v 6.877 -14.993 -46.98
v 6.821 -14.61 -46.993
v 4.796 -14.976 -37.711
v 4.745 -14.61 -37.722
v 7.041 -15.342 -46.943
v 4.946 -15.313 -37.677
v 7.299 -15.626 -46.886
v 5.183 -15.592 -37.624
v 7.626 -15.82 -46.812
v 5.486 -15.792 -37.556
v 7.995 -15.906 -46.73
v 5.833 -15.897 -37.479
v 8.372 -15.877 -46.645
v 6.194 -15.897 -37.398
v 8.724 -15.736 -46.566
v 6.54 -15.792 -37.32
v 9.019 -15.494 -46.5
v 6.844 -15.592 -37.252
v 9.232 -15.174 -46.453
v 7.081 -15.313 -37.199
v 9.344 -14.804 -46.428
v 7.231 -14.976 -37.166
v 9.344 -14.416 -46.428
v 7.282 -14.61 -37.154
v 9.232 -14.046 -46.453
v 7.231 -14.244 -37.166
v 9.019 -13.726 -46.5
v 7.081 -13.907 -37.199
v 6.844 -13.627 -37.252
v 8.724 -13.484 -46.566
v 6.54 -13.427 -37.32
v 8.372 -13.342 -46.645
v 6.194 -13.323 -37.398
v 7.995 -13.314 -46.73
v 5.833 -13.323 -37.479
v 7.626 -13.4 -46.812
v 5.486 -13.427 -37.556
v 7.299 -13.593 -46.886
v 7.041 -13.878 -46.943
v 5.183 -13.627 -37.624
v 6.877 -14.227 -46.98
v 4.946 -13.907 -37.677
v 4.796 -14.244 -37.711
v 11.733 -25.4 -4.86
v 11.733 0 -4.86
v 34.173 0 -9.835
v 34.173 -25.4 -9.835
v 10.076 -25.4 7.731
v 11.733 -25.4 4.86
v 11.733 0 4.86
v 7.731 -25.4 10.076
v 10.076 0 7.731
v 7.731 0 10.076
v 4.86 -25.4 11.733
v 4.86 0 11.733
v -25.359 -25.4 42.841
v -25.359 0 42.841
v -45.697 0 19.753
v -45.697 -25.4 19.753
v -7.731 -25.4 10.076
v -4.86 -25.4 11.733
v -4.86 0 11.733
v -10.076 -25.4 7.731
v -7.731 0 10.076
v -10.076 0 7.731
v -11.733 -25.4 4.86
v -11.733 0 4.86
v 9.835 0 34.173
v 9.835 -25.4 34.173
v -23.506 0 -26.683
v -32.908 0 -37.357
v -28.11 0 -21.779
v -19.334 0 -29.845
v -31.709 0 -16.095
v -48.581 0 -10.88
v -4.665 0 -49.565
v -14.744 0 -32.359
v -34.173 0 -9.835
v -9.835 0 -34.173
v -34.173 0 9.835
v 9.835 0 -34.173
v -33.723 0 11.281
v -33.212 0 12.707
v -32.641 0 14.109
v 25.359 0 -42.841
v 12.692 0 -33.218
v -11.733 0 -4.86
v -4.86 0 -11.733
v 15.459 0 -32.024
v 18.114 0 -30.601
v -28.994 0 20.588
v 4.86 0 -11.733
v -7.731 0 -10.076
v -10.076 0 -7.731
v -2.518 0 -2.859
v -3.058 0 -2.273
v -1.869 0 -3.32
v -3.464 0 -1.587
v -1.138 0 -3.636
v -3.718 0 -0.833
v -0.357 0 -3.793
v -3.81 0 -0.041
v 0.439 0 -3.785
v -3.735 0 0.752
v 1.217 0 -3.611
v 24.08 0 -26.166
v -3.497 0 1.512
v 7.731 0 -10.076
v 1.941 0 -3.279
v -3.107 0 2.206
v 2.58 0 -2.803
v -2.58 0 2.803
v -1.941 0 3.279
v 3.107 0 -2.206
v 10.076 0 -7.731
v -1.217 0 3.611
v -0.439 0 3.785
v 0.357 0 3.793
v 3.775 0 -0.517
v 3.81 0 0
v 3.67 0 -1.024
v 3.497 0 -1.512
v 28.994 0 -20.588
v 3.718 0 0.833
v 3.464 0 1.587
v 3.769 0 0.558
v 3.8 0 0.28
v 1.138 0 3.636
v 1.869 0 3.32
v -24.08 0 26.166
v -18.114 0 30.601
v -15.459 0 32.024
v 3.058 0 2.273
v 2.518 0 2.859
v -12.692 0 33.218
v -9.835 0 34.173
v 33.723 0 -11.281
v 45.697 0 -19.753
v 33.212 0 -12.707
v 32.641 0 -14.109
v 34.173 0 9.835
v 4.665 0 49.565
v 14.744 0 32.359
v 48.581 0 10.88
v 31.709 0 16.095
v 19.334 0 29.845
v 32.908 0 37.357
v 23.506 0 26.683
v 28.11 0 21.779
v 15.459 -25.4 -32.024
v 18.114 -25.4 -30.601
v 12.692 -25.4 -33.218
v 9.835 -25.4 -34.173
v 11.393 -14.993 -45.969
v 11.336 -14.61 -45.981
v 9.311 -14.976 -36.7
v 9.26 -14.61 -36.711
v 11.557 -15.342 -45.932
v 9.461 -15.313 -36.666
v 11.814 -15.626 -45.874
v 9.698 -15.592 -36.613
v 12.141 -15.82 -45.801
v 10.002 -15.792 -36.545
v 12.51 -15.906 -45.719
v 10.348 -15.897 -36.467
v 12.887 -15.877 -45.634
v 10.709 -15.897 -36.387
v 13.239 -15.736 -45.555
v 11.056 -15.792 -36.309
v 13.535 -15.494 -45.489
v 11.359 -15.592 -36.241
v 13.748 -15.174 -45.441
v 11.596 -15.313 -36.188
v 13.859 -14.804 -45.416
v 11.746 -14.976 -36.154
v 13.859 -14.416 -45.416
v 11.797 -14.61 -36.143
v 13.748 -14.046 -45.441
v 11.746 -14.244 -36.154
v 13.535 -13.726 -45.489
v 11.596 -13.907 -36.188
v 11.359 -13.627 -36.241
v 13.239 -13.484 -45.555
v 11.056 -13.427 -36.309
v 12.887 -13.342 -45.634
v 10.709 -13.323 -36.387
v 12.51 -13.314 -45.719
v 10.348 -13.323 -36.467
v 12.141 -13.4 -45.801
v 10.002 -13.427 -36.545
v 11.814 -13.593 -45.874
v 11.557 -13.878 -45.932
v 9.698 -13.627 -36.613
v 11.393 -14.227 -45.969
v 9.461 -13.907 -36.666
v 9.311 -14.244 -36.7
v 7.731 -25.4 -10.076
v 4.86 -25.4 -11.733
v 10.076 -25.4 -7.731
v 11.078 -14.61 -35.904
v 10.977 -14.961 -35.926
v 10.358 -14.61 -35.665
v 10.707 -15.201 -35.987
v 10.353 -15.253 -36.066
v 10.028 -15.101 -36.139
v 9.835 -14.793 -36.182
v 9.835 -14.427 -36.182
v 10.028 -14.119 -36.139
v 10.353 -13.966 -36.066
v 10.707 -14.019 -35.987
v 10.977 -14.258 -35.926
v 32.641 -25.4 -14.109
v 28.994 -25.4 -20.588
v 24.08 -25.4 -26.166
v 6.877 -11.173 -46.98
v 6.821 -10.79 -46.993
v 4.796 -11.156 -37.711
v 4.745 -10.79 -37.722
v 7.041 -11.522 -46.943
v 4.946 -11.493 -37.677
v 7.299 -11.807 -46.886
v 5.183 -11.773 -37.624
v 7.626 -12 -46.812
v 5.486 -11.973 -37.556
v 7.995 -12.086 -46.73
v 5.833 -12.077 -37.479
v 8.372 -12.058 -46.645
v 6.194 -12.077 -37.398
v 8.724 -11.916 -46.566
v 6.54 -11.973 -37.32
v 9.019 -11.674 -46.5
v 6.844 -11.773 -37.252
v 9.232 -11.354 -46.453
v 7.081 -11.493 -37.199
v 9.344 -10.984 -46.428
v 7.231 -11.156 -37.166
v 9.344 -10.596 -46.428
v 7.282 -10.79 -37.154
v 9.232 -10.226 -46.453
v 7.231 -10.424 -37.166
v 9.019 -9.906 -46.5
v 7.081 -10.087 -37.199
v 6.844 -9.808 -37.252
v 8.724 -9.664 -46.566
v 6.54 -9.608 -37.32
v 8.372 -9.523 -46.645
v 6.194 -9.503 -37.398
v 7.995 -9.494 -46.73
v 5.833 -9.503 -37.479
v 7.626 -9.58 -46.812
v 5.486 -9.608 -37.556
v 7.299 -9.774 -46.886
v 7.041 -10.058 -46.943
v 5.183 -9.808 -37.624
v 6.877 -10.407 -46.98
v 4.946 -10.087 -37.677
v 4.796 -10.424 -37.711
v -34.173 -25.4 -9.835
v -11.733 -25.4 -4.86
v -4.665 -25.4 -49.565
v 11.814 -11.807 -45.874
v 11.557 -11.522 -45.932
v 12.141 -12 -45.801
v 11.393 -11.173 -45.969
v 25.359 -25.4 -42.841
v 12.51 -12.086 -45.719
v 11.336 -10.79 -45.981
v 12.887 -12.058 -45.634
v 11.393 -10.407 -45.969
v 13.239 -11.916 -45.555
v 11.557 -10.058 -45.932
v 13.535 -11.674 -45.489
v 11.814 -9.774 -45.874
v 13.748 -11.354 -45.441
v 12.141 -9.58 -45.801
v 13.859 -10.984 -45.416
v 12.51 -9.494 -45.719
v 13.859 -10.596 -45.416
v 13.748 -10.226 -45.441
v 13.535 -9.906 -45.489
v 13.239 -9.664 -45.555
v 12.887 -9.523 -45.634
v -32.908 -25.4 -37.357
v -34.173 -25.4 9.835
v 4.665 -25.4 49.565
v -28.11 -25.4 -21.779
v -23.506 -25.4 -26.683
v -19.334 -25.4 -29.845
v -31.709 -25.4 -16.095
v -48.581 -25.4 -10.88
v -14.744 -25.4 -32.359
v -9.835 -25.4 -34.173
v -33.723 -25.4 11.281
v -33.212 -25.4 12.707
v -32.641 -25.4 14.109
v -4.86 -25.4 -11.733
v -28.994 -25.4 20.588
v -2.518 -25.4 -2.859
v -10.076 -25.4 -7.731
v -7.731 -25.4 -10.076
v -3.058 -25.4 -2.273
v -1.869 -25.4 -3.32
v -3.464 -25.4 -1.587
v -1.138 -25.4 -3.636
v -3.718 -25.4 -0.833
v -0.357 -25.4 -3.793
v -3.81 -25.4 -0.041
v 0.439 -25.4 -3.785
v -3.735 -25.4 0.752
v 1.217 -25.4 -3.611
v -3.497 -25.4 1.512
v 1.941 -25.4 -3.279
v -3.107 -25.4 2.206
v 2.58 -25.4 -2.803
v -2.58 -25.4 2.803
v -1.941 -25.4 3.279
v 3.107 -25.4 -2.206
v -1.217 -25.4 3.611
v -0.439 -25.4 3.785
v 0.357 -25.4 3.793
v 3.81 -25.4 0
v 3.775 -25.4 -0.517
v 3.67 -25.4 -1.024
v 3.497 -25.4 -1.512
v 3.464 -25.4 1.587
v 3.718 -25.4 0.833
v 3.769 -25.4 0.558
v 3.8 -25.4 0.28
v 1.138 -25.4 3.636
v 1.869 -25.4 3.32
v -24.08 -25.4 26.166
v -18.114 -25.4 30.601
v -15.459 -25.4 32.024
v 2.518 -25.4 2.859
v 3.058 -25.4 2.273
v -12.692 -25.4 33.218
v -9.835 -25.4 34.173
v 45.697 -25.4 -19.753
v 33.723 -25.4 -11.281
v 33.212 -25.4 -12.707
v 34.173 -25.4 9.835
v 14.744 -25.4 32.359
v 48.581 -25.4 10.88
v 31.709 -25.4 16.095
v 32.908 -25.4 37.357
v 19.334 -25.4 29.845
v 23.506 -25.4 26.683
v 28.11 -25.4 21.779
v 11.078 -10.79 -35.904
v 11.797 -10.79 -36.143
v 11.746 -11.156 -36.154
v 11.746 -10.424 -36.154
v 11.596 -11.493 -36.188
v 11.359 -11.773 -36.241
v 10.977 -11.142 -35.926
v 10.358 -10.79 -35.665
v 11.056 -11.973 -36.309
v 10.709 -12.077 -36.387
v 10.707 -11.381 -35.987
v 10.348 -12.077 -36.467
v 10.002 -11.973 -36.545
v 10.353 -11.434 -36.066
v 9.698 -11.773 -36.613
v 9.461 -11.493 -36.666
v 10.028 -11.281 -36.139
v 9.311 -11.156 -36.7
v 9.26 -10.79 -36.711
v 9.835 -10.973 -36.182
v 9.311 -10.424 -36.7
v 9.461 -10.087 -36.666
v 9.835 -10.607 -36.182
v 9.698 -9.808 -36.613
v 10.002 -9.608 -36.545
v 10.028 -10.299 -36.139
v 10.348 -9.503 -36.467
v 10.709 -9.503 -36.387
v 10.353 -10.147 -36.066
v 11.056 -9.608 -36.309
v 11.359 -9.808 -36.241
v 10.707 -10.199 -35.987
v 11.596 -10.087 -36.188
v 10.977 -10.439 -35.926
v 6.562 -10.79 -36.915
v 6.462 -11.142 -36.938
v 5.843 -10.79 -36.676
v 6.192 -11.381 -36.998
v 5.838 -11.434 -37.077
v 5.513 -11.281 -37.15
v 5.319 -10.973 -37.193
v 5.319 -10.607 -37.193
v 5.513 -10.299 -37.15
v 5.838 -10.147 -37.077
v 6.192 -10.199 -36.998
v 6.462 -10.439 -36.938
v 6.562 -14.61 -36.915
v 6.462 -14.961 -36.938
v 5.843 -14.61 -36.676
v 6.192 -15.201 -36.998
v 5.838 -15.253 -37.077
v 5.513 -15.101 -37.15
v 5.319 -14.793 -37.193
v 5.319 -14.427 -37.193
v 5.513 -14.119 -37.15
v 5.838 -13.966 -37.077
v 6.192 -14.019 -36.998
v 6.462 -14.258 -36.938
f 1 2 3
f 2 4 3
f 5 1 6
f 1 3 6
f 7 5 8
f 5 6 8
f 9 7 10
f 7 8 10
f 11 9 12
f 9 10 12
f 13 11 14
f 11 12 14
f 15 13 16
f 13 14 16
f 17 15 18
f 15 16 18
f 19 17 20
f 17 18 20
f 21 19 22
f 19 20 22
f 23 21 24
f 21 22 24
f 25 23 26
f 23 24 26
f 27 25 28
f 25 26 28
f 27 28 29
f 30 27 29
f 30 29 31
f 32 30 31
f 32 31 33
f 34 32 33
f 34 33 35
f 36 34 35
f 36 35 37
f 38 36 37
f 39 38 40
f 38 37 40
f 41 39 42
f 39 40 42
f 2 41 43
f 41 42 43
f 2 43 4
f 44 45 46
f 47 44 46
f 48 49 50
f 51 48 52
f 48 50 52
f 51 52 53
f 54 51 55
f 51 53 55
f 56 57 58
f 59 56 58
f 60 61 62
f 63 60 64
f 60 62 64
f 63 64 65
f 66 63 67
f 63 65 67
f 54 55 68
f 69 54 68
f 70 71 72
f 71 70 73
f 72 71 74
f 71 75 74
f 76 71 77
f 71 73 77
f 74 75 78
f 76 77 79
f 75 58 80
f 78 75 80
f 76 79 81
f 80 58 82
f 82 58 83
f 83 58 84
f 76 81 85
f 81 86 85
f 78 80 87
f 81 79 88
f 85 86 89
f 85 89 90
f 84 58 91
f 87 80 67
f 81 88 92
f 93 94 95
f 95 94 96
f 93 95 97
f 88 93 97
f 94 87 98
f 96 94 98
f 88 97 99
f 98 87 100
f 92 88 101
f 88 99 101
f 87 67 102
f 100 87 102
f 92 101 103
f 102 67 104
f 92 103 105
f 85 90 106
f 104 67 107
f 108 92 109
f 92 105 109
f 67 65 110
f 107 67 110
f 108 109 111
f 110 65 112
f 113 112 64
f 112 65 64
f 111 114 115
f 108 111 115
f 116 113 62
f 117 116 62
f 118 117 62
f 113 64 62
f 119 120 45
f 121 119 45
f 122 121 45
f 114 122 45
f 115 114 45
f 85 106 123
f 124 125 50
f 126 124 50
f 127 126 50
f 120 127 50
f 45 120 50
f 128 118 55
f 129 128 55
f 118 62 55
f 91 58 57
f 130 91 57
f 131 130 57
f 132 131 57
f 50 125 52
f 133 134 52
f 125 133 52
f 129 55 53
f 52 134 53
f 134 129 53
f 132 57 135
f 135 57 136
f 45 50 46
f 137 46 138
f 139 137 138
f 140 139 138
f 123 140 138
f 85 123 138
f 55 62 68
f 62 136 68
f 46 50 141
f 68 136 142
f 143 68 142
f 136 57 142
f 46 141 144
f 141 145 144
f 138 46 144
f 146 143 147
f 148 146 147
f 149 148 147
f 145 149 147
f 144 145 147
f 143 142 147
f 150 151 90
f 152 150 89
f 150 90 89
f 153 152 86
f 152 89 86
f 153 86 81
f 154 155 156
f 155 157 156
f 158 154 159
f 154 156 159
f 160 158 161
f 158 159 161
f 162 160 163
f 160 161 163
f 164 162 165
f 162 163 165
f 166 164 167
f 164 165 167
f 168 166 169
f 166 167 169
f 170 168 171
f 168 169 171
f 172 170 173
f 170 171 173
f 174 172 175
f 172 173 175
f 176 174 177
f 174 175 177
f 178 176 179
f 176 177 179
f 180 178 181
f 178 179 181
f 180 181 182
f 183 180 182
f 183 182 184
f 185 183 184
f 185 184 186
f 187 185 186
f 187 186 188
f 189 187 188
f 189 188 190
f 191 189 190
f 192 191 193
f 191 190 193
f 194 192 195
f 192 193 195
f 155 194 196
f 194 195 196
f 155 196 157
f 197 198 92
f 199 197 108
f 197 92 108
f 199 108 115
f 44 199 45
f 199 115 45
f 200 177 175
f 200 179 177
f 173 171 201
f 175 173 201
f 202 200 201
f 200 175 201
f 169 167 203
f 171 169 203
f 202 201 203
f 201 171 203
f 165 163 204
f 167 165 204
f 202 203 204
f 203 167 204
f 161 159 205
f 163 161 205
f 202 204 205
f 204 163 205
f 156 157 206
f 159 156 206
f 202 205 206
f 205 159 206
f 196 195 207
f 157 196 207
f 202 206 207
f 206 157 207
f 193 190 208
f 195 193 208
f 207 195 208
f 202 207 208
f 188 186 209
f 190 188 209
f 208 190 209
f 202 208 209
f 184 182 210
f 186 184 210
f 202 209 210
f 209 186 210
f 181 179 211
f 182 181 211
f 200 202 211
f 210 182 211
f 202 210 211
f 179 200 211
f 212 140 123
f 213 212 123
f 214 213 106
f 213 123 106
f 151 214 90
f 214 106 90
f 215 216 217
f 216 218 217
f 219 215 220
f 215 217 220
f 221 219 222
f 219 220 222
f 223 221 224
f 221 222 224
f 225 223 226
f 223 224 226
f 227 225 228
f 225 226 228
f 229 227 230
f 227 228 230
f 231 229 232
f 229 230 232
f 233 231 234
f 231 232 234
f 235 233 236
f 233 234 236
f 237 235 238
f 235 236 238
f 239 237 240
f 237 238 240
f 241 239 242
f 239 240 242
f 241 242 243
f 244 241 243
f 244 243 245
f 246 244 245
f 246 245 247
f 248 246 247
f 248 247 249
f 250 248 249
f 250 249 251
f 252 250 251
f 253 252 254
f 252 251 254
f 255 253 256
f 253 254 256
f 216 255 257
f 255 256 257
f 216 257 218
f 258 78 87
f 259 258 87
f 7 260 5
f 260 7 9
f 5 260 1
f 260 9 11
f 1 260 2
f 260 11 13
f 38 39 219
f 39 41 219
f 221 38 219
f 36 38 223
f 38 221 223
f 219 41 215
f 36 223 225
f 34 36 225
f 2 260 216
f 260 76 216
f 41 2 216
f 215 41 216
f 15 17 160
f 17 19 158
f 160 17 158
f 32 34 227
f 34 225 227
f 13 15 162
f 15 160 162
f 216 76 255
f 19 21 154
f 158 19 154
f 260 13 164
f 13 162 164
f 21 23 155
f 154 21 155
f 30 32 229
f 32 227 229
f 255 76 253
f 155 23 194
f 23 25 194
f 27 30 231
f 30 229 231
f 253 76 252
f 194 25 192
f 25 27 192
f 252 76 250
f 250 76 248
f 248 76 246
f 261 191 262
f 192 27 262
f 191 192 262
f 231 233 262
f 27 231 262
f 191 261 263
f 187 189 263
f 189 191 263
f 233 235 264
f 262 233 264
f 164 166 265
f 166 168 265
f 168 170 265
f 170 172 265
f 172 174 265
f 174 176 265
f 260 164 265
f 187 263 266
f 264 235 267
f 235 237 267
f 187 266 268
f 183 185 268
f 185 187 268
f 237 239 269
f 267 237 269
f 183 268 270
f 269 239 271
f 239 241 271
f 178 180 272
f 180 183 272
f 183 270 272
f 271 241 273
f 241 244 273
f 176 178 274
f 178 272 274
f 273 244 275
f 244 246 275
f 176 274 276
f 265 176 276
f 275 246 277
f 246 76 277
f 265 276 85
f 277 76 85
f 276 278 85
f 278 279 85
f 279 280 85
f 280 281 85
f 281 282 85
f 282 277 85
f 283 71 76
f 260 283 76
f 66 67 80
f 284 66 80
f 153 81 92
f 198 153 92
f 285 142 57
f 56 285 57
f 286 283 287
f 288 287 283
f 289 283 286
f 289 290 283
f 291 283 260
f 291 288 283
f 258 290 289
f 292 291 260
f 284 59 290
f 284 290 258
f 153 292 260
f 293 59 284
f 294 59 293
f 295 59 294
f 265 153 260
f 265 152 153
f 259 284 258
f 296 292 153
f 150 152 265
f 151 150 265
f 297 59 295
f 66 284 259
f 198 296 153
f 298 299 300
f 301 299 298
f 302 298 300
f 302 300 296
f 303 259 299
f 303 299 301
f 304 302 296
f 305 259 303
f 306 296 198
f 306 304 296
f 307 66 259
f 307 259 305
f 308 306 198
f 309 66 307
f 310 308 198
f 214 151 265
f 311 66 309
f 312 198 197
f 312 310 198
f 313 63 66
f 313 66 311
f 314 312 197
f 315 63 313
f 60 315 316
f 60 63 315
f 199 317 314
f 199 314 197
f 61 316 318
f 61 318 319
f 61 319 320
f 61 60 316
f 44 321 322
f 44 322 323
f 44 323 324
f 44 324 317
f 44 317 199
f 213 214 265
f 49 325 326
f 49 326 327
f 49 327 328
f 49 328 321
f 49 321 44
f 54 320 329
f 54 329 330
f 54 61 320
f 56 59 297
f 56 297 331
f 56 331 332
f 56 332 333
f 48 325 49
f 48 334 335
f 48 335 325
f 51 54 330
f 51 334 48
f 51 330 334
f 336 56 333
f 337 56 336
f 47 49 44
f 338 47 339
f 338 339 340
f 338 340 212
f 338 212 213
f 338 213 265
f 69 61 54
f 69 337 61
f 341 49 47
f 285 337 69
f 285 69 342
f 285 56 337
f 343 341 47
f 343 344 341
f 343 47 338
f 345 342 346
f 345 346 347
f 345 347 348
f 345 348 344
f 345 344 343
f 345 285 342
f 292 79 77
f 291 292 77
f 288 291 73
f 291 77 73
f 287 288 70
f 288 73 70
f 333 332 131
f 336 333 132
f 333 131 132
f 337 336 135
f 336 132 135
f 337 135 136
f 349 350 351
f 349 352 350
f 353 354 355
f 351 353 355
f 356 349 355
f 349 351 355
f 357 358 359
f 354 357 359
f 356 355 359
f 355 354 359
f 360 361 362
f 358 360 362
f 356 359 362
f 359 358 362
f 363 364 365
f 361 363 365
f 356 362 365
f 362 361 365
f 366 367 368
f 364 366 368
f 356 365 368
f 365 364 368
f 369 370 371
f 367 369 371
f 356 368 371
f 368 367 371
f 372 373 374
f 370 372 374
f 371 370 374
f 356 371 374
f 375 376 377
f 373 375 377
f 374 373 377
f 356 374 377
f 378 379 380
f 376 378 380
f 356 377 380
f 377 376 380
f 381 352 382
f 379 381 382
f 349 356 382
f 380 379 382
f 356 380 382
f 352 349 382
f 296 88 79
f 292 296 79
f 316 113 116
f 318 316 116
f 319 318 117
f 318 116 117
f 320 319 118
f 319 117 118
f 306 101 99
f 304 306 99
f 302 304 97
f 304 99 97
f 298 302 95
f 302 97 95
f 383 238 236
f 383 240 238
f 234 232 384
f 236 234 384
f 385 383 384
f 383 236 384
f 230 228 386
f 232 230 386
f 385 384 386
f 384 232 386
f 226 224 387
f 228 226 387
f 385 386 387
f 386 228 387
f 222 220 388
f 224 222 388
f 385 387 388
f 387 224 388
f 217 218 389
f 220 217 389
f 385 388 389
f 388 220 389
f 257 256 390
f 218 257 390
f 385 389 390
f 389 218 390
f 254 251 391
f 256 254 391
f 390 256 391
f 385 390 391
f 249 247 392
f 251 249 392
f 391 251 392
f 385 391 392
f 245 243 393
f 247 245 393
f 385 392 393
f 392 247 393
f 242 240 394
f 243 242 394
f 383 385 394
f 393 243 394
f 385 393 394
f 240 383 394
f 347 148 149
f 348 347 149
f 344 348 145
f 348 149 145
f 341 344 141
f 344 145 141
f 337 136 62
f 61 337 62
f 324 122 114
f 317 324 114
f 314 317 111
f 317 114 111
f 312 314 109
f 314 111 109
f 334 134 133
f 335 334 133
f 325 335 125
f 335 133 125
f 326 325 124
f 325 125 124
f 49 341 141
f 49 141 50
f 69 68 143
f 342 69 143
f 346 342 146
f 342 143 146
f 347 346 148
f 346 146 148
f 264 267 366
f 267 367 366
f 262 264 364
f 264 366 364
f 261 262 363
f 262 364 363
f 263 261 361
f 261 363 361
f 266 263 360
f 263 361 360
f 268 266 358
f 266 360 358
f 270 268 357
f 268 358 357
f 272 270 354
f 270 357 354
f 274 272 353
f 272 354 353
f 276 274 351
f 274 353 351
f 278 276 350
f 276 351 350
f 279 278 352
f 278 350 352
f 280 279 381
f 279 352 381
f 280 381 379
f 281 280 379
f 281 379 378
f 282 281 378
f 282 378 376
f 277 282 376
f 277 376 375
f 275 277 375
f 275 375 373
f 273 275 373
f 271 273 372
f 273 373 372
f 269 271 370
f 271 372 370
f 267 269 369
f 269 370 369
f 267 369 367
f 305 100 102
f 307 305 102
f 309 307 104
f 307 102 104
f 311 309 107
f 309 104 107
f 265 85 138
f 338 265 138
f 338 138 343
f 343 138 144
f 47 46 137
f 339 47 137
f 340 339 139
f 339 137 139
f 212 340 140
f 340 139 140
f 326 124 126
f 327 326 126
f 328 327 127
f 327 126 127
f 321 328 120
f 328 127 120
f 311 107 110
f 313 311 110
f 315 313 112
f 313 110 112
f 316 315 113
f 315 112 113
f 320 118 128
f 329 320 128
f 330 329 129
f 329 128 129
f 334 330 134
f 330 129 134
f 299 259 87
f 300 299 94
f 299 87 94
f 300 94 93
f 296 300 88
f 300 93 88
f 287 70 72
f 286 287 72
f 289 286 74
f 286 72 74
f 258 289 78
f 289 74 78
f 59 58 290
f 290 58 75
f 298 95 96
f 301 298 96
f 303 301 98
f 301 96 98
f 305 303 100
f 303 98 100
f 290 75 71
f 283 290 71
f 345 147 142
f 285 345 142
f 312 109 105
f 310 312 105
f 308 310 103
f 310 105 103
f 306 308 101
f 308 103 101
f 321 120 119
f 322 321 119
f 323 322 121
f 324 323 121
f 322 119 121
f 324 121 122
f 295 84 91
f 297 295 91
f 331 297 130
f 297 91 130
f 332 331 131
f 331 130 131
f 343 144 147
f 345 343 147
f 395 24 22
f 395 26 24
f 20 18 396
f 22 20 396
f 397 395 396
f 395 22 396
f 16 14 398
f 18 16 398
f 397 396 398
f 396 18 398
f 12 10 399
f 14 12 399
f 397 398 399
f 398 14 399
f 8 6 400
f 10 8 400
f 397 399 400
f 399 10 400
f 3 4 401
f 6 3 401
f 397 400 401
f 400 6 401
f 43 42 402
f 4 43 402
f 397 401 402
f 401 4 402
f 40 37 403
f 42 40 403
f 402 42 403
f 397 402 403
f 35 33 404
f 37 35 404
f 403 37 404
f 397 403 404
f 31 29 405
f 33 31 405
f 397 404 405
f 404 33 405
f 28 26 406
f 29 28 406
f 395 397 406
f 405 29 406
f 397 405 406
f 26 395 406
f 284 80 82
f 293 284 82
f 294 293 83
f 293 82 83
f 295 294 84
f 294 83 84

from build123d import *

# Parameters (mm, degrees)
F1_DEPTH = 25.4
F3_D     = 2.6
F3_DEPTH = 9.5
F3_TIP   = 0.7811188047


with BuildPart() as f1:
    # F0 (on Front) → F1 (new body)
    with BuildSketch(Plane.XZ):
        with BuildLine():
            ThreePointArc((4.860079591, -11.7332700629), (8.9802561211, -8.9802561211), (11.7332700629, -4.860079591))
            ThreePointArc((11.7332700629, -4.860079591), (12.4559730611, -2.4776470896), (12.7, 0))
            ThreePointArc((12.7, 0), (12.4559730611, 2.4776470896), (11.7332700629, 4.860079591))
            ThreePointArc((11.7332700629, 4.860079591), (8.9802561211, 8.9802561211), (4.860079591, 11.7332700629))
            ThreePointArc((4.860079591, 11.7332700629), (0, 12.7), (-4.860079591, 11.7332700629))
            ThreePointArc((-4.860079591, 11.7332700629), (-8.9802561211, 8.9802561211), (-11.7332700629, 4.860079591))
            ThreePointArc((-11.7332700629, 4.860079591), (-12.7, 0), (-11.7332700629, -4.860079591))
            ThreePointArc((-11.7332700629, -4.860079591), (-8.9802561211, -8.9802561211), (-4.860079591, -11.7332700629))
            ThreePointArc((-4.860079591, -11.7332700629), (0, -12.7), (4.860079591, -11.7332700629))
        make_face()
        with BuildLine():
            ThreePointArc((3.7179078086, 0.83262328), (3.7869069668, 0.4188503605), (3.81, 0))
            ThreePointArc((3.81, 0), (3.7309944269, -0.7718682441), (3.4972542854, -1.5117249959))
            ThreePointArc((3.4972542854, -1.5117249959), (2.8589377627, -2.518446916), (1.9407684924, -3.278645705))
            ThreePointArc((1.9407684924, -3.278645705), (0.83262328, -3.7179078086), (-0.3570249003, -3.7932351918))
            ThreePointArc((-0.3570249003, -3.7932351918), (-1.5117249959, -3.4972542854), (-2.518446916, -2.8589377627))
            ThreePointArc((-2.518446916, -2.8589377627), (-3.278645705, -1.9407684924), (-3.7179078086, -0.83262328))
            ThreePointArc((-3.7179078086, -0.83262328), (-3.7932351918, 0.3570249003), (-3.4972542854, 1.5117249959))
            ThreePointArc((-3.4972542854, 1.5117249959), (-2.8589377627, 2.518446916), (-1.9407684924, 3.278645705))
            ThreePointArc((-1.9407684924, 3.278645705), (-0.83262328, 3.7179078086), (0.3570249003, 3.7932351918))
            ThreePointArc((0.3570249003, 3.7932351918), (1.5117249959, 3.4972542854), (2.518446916, 2.8589377627))
            ThreePointArc((2.518446916, 2.8589377627), (3.278645705, 1.9407684924), (3.7179078086, 0.83262328))
        make_face(mode=Mode.SUBTRACT)
        with BuildLine():
            Line((4.860079591, 11.7332700629), (9.8348340353, 34.1729372384))
            ThreePointArc((9.8348340353, 34.1729372384), (6.6122234033, 34.9398354556), (3.3322324031, 35.4035284571))
            ThreePointArc((3.3322324031, 35.4035284571), (-3.3090097739, 35.4057065219), (-9.8348340353, 34.1729372384))
            Line((-9.8348340353, 34.1729372384), (-4.860079591, 11.7332700629))
            ThreePointArc((-4.860079591, 11.7332700629), (0, 12.7), (4.860079591, 11.7332700629))
        make_face()
        with BuildLine():
            ThreePointArc((34.1729372384, -9.8348340353), (35.2115268641, -4.9660825508), (35.56, 0))
            ThreePointArc((35.56, 0), (35.3444650238, 3.9092700317), (34.7004728807, 7.7711506133))
            ThreePointArc((34.7004728807, 7.7711506133), (34.4521603484, 8.8069431317), (34.1729372384, 9.8348340353))
            Line((34.1729372384, 9.8348340353), (11.7332700629, 4.860079591))
            ThreePointArc((11.7332700629, 4.860079591), (12.4559730611, 2.4776470896), (12.7, 0))
            ThreePointArc((12.7, 0), (12.4559730611, -2.4776470896), (11.7332700629, -4.860079591))
            Line((11.7332700629, -4.860079591), (34.1729372384, -9.8348340353))
        make_face()
        with BuildLine():
            Line((9.8348340353, -34.1729372384), (4.860079591, -11.7332700629))
            ThreePointArc((4.860079591, -11.7332700629), (0, -12.7), (-4.860079591, -11.7332700629))
            Line((-4.860079591, -11.7332700629), (-9.8348340353, -34.1729372384))
            ThreePointArc((-9.8348340353, -34.1729372384), (-6.6122234033, -34.9398354556), (-3.3322324031, -35.4035284571))
            ThreePointArc((-3.3322324031, -35.4035284571), (3.3090097739, -35.4057065219), (9.8348340353, -34.1729372384))
        make_face()
        with BuildLine():
            Line((-34.1729372384, -9.8348340353), (-11.7332700629, -4.860079591))
            ThreePointArc((-11.7332700629, -4.860079591), (-12.7, 0), (-11.7332700629, 4.860079591))
            Line((-11.7332700629, 4.860079591), (-34.1729372384, 9.8348340353))
            ThreePointArc((-34.1729372384, 9.8348340353), (-35.5440477326, 1.0650214928), (-34.7004728807, -7.7711506133))
            ThreePointArc((-34.7004728807, -7.7711506133), (-34.4521603484, -8.8069431317), (-34.1729372384, -9.8348340353))
        make_face()
        with BuildLine():
            Line((-32.6410399972, 14.1094332949), (-45.697455996, 19.7532066129))
            Line((-45.697455996, 19.7532066129), (-48.580662033, -10.8796108586))
            Line((-48.580662033, -10.8796108586), (-34.7004728807, -7.7711506133))
            ThreePointArc((-34.7004728807, -7.7711506133), (-35.5440477326, 1.0650214928), (-34.1729372384, 9.8348340353))
            ThreePointArc((-34.1729372384, 9.8348340353), (-33.475288471, 11.996610429), (-32.6410399972, 14.1094332949))
        make_face()
        with BuildLine():
            Line((-18.1138392628, 30.6006932464), (-25.359374968, 42.840970545))
            Line((-25.359374968, 42.840970545), (-45.697455996, 19.7532066129))
            Line((-45.697455996, 19.7532066129), (-32.6410399972, 14.1094332949))
            ThreePointArc((-32.6410399972, 14.1094332949), (-26.6834191188, 23.5055045495), (-18.1138392628, 30.6006932464))
        make_face()
        with BuildLine():
            Line((3.3322324031, 35.4035284571), (4.6651253644, 49.5649398399))
            Line((4.6651253644, 49.5649398399), (-25.359374968, 42.840970545))
            Line((-25.359374968, 42.840970545), (-18.1138392628, 30.6006932464))
            ThreePointArc((-18.1138392628, 30.6006932464), (-14.0880203211, 32.650287647), (-9.8348340353, 34.1729372384))
            ThreePointArc((-9.8348340353, 34.1729372384), (-3.3090097739, 35.4057065219), (3.3322324031, 35.4035284571))
        make_face()
        with BuildLine():
            ThreePointArc((9.8348340353, 34.1729372384), (17.0856010914, 31.1864687861), (23.5055045495, 26.6834191188))
            Line((23.5055045495, 26.6834191188), (32.9077063694, 37.3567867664))
            Line((32.9077063694, 37.3567867664), (4.6651253644, 49.5649398399))
            Line((4.6651253644, 49.5649398399), (3.3322324031, 35.4035284571))
            ThreePointArc((3.3322324031, 35.4035284571), (6.6122234033, 34.9398354556), (9.8348340353, 34.1729372384))
        make_face()
        with BuildLine():
            ThreePointArc((34.1729372384, 9.8348340353), (34.4521603484, 8.8069431317), (34.7004728807, 7.7711506133))
            Line((34.7004728807, 7.7711506133), (48.580662033, 10.8796108586))
            Line((48.580662033, 10.8796108586), (32.9077063694, 37.3567867664))
            Line((32.9077063694, 37.3567867664), (23.5055045495, 26.6834191188))
            ThreePointArc((23.5055045495, 26.6834191188), (30.0444565036, 19.0222036946), (34.1729372384, 9.8348340353))
        make_face()
        with BuildLine():
            ThreePointArc((34.7004728807, 7.7711506133), (35.3444650238, 3.9092700317), (35.56, 0))
            ThreePointArc((35.56, 0), (35.2115268641, -4.9660825508), (34.1729372384, -9.8348340353))
            ThreePointArc((34.1729372384, -9.8348340353), (33.475288471, -11.996610429), (32.6410399972, -14.1094332949))
            Line((32.6410399972, -14.1094332949), (45.697455996, -19.7532066129))
            Line((45.697455996, -19.7532066129), (48.580662033, 10.8796108586))
            Line((48.580662033, 10.8796108586), (34.7004728807, 7.7711506133))
        make_face()
        with BuildLine():
            Line((45.697455996, -19.7532066129), (32.6410399972, -14.1094332949))
            ThreePointArc((32.6410399972, -14.1094332949), (26.6834191188, -23.5055045495), (18.1138392628, -30.6006932464))
            Line((18.1138392628, -30.6006932464), (25.359374968, -42.840970545))
            Line((25.359374968, -42.840970545), (45.697455996, -19.7532066129))
        make_face()
        with BuildLine():
            Line((25.359374968, -42.840970545), (18.1138392628, -30.6006932464))
            ThreePointArc((18.1138392628, -30.6006932464), (14.0880203211, -32.650287647), (9.8348340353, -34.1729372384))
            ThreePointArc((9.8348340353, -34.1729372384), (3.3090097739, -35.4057065219), (-3.3322324031, -35.4035284571))
            Line((-3.3322324031, -35.4035284571), (-4.6651253644, -49.5649398399))
            Line((-4.6651253644, -49.5649398399), (25.359374968, -42.840970545))
        make_face()
        with BuildLine():
            Line((-32.9077063694, -37.3567867664), (-4.6651253644, -49.5649398399))
            Line((-4.6651253644, -49.5649398399), (-3.3322324031, -35.4035284571))
            ThreePointArc((-3.3322324031, -35.4035284571), (-6.6122234033, -34.9398354556), (-9.8348340353, -34.1729372384))
            ThreePointArc((-9.8348340353, -34.1729372384), (-17.0856010914, -31.1864687861), (-23.5055045495, -26.6834191188))
            Line((-23.5055045495, -26.6834191188), (-32.9077063694, -37.3567867664))
        make_face()
        with BuildLine():
            Line((-48.580662033, -10.8796108586), (-32.9077063694, -37.3567867664))
            Line((-32.9077063694, -37.3567867664), (-23.5055045495, -26.6834191188))
            ThreePointArc((-23.5055045495, -26.6834191188), (-30.0444565036, -19.0222036946), (-34.1729372384, -9.8348340353))
            ThreePointArc((-34.1729372384, -9.8348340353), (-34.4521603484, -8.8069431317), (-34.7004728807, -7.7711506133))
            Line((-34.7004728807, -7.7711506133), (-48.580662033, -10.8796108586))
        make_face()
    extrude(amount=F1_DEPTH)

    # F3
    with Locations(Plane(origin=(10.3471248018, 0, -46.2029551924), x_dir=(0.9758288212, 0, 0.218536294), z_dir=(0.218536294, 0, -0.9758288212))):
        with Locations((-2.3135205983, 14.6098749805), (2.3135205983, 14.6098749805), (2.3135205983, 10.7901250195), (-2.3135205983, 10.7901250195)):
            Hole(F3_D / 2, depth=F3_DEPTH)
            with Locations((0, 0, -(F3_DEPTH + F3_TIP / 2))):  # 118° drill point
                Cone(0, F3_D / 2, F3_TIP, mode=Mode.SUBTRACT)


solid = f1.part
